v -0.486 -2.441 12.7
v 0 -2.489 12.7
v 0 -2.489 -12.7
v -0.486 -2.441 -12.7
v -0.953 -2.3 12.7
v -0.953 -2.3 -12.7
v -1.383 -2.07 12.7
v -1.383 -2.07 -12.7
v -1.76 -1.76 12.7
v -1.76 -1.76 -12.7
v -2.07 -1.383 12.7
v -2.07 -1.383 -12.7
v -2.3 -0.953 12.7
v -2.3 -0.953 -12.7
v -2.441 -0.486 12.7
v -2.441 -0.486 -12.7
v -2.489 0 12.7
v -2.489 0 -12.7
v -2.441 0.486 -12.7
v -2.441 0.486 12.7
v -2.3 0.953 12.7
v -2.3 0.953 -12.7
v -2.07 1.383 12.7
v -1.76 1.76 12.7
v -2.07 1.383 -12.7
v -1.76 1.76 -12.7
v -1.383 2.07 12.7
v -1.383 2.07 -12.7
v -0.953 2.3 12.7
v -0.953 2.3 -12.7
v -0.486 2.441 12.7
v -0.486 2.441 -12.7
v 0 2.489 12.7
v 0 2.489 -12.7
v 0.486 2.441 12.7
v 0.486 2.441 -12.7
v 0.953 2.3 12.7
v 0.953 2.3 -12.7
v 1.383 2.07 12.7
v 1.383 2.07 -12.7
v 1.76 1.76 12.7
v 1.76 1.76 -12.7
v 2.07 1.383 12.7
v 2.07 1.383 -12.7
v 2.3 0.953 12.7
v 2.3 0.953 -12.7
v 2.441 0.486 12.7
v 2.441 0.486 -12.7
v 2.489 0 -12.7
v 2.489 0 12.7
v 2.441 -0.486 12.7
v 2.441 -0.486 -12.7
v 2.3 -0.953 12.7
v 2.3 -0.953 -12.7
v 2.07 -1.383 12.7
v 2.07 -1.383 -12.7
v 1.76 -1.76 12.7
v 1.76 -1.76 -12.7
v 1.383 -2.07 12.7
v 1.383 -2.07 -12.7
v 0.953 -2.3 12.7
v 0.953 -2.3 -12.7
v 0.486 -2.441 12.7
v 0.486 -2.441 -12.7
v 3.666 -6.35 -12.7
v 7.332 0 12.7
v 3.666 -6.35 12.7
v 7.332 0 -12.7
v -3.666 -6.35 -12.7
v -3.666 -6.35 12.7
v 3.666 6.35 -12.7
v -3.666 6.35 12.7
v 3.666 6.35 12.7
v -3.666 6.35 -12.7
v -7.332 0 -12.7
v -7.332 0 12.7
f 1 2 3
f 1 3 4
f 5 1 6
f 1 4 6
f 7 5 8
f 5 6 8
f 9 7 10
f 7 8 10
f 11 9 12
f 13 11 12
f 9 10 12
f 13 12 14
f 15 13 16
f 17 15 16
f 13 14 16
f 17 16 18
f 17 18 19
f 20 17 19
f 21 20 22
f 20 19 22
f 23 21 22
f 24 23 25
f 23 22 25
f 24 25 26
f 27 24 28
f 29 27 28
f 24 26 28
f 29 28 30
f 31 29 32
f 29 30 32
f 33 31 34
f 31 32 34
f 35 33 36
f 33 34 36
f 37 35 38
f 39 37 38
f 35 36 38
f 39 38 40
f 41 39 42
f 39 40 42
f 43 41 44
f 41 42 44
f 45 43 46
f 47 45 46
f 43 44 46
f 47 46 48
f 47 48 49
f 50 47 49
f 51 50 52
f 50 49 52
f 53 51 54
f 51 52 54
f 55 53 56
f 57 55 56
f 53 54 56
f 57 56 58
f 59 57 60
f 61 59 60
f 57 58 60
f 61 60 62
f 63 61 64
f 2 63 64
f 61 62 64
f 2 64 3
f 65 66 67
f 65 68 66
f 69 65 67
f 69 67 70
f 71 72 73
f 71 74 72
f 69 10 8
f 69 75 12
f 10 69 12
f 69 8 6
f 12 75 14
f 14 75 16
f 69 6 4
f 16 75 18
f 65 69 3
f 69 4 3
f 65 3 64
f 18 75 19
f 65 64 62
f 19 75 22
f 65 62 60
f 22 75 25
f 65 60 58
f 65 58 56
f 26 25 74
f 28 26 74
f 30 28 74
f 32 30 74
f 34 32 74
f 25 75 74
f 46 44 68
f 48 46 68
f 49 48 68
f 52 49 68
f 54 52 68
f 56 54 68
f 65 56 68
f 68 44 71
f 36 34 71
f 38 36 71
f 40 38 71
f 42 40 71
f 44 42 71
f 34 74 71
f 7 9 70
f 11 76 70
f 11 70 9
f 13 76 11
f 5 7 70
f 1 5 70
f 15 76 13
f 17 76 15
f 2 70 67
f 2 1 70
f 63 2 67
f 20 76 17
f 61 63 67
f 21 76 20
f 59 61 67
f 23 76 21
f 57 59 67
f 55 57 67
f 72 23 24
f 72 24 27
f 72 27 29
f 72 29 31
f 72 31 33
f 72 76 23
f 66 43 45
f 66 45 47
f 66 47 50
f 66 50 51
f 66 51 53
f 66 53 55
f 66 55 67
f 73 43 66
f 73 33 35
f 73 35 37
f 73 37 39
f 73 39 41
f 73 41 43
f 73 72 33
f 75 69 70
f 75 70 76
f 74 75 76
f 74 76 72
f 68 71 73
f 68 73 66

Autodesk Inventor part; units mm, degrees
ref_plane "YZ Plane" through (0, 0, 0) normal (1, 0, 0) x (0, 1, 0)
ref_plane "XZ Plane" through (0, 0, 0) normal (0, 1, 0) x (-1, 0, 0)
ref_plane "XY Plane" through (0, 0, 0) normal (0, 0, 1) x (1, 0, 0)
sketch "Sketch1" plane through (0, 0, 0) normal (0, 0, 1) x (1, 0, 0)
  line L0 (-3.6662, 6.35) -> (3.6662, 6.35)
  line L1 (3.6662, 6.35) -> (7.3323, 0)
  line L2 (7.3323, 0) -> (3.6662, -6.35)
  line L3 (3.6662, -6.35) -> (-3.6662, -6.35)
  line L4 (-3.6662, -6.35) -> (-7.3323, 0)
  line L5 (-7.3323, 0) -> (-3.6662, 6.35)
  point P0 (0, 0)
  point P1 (0, 0)
  dimension "d0" = 12.7
extrude "Extrusion1" add sketch "Sketch1" along normal mid plane 25.4
sketch "Sketch2" plane through (0, 0, 12.7) normal (0, 0, 1) x (1, 0, 0)
  point P0 (0, 0)
  point P1 (0, 0)
hole "Hole1" at (0, 0, 12.7) direction (0, 0, -1) diameter 4.9784 end through all thread size "1/4-20 UNC" class "2B" standard "ANSI Unified Screw Threads"
properties part number "Hex Standoff 14-20 x1000" material "Aluminum 6061"
